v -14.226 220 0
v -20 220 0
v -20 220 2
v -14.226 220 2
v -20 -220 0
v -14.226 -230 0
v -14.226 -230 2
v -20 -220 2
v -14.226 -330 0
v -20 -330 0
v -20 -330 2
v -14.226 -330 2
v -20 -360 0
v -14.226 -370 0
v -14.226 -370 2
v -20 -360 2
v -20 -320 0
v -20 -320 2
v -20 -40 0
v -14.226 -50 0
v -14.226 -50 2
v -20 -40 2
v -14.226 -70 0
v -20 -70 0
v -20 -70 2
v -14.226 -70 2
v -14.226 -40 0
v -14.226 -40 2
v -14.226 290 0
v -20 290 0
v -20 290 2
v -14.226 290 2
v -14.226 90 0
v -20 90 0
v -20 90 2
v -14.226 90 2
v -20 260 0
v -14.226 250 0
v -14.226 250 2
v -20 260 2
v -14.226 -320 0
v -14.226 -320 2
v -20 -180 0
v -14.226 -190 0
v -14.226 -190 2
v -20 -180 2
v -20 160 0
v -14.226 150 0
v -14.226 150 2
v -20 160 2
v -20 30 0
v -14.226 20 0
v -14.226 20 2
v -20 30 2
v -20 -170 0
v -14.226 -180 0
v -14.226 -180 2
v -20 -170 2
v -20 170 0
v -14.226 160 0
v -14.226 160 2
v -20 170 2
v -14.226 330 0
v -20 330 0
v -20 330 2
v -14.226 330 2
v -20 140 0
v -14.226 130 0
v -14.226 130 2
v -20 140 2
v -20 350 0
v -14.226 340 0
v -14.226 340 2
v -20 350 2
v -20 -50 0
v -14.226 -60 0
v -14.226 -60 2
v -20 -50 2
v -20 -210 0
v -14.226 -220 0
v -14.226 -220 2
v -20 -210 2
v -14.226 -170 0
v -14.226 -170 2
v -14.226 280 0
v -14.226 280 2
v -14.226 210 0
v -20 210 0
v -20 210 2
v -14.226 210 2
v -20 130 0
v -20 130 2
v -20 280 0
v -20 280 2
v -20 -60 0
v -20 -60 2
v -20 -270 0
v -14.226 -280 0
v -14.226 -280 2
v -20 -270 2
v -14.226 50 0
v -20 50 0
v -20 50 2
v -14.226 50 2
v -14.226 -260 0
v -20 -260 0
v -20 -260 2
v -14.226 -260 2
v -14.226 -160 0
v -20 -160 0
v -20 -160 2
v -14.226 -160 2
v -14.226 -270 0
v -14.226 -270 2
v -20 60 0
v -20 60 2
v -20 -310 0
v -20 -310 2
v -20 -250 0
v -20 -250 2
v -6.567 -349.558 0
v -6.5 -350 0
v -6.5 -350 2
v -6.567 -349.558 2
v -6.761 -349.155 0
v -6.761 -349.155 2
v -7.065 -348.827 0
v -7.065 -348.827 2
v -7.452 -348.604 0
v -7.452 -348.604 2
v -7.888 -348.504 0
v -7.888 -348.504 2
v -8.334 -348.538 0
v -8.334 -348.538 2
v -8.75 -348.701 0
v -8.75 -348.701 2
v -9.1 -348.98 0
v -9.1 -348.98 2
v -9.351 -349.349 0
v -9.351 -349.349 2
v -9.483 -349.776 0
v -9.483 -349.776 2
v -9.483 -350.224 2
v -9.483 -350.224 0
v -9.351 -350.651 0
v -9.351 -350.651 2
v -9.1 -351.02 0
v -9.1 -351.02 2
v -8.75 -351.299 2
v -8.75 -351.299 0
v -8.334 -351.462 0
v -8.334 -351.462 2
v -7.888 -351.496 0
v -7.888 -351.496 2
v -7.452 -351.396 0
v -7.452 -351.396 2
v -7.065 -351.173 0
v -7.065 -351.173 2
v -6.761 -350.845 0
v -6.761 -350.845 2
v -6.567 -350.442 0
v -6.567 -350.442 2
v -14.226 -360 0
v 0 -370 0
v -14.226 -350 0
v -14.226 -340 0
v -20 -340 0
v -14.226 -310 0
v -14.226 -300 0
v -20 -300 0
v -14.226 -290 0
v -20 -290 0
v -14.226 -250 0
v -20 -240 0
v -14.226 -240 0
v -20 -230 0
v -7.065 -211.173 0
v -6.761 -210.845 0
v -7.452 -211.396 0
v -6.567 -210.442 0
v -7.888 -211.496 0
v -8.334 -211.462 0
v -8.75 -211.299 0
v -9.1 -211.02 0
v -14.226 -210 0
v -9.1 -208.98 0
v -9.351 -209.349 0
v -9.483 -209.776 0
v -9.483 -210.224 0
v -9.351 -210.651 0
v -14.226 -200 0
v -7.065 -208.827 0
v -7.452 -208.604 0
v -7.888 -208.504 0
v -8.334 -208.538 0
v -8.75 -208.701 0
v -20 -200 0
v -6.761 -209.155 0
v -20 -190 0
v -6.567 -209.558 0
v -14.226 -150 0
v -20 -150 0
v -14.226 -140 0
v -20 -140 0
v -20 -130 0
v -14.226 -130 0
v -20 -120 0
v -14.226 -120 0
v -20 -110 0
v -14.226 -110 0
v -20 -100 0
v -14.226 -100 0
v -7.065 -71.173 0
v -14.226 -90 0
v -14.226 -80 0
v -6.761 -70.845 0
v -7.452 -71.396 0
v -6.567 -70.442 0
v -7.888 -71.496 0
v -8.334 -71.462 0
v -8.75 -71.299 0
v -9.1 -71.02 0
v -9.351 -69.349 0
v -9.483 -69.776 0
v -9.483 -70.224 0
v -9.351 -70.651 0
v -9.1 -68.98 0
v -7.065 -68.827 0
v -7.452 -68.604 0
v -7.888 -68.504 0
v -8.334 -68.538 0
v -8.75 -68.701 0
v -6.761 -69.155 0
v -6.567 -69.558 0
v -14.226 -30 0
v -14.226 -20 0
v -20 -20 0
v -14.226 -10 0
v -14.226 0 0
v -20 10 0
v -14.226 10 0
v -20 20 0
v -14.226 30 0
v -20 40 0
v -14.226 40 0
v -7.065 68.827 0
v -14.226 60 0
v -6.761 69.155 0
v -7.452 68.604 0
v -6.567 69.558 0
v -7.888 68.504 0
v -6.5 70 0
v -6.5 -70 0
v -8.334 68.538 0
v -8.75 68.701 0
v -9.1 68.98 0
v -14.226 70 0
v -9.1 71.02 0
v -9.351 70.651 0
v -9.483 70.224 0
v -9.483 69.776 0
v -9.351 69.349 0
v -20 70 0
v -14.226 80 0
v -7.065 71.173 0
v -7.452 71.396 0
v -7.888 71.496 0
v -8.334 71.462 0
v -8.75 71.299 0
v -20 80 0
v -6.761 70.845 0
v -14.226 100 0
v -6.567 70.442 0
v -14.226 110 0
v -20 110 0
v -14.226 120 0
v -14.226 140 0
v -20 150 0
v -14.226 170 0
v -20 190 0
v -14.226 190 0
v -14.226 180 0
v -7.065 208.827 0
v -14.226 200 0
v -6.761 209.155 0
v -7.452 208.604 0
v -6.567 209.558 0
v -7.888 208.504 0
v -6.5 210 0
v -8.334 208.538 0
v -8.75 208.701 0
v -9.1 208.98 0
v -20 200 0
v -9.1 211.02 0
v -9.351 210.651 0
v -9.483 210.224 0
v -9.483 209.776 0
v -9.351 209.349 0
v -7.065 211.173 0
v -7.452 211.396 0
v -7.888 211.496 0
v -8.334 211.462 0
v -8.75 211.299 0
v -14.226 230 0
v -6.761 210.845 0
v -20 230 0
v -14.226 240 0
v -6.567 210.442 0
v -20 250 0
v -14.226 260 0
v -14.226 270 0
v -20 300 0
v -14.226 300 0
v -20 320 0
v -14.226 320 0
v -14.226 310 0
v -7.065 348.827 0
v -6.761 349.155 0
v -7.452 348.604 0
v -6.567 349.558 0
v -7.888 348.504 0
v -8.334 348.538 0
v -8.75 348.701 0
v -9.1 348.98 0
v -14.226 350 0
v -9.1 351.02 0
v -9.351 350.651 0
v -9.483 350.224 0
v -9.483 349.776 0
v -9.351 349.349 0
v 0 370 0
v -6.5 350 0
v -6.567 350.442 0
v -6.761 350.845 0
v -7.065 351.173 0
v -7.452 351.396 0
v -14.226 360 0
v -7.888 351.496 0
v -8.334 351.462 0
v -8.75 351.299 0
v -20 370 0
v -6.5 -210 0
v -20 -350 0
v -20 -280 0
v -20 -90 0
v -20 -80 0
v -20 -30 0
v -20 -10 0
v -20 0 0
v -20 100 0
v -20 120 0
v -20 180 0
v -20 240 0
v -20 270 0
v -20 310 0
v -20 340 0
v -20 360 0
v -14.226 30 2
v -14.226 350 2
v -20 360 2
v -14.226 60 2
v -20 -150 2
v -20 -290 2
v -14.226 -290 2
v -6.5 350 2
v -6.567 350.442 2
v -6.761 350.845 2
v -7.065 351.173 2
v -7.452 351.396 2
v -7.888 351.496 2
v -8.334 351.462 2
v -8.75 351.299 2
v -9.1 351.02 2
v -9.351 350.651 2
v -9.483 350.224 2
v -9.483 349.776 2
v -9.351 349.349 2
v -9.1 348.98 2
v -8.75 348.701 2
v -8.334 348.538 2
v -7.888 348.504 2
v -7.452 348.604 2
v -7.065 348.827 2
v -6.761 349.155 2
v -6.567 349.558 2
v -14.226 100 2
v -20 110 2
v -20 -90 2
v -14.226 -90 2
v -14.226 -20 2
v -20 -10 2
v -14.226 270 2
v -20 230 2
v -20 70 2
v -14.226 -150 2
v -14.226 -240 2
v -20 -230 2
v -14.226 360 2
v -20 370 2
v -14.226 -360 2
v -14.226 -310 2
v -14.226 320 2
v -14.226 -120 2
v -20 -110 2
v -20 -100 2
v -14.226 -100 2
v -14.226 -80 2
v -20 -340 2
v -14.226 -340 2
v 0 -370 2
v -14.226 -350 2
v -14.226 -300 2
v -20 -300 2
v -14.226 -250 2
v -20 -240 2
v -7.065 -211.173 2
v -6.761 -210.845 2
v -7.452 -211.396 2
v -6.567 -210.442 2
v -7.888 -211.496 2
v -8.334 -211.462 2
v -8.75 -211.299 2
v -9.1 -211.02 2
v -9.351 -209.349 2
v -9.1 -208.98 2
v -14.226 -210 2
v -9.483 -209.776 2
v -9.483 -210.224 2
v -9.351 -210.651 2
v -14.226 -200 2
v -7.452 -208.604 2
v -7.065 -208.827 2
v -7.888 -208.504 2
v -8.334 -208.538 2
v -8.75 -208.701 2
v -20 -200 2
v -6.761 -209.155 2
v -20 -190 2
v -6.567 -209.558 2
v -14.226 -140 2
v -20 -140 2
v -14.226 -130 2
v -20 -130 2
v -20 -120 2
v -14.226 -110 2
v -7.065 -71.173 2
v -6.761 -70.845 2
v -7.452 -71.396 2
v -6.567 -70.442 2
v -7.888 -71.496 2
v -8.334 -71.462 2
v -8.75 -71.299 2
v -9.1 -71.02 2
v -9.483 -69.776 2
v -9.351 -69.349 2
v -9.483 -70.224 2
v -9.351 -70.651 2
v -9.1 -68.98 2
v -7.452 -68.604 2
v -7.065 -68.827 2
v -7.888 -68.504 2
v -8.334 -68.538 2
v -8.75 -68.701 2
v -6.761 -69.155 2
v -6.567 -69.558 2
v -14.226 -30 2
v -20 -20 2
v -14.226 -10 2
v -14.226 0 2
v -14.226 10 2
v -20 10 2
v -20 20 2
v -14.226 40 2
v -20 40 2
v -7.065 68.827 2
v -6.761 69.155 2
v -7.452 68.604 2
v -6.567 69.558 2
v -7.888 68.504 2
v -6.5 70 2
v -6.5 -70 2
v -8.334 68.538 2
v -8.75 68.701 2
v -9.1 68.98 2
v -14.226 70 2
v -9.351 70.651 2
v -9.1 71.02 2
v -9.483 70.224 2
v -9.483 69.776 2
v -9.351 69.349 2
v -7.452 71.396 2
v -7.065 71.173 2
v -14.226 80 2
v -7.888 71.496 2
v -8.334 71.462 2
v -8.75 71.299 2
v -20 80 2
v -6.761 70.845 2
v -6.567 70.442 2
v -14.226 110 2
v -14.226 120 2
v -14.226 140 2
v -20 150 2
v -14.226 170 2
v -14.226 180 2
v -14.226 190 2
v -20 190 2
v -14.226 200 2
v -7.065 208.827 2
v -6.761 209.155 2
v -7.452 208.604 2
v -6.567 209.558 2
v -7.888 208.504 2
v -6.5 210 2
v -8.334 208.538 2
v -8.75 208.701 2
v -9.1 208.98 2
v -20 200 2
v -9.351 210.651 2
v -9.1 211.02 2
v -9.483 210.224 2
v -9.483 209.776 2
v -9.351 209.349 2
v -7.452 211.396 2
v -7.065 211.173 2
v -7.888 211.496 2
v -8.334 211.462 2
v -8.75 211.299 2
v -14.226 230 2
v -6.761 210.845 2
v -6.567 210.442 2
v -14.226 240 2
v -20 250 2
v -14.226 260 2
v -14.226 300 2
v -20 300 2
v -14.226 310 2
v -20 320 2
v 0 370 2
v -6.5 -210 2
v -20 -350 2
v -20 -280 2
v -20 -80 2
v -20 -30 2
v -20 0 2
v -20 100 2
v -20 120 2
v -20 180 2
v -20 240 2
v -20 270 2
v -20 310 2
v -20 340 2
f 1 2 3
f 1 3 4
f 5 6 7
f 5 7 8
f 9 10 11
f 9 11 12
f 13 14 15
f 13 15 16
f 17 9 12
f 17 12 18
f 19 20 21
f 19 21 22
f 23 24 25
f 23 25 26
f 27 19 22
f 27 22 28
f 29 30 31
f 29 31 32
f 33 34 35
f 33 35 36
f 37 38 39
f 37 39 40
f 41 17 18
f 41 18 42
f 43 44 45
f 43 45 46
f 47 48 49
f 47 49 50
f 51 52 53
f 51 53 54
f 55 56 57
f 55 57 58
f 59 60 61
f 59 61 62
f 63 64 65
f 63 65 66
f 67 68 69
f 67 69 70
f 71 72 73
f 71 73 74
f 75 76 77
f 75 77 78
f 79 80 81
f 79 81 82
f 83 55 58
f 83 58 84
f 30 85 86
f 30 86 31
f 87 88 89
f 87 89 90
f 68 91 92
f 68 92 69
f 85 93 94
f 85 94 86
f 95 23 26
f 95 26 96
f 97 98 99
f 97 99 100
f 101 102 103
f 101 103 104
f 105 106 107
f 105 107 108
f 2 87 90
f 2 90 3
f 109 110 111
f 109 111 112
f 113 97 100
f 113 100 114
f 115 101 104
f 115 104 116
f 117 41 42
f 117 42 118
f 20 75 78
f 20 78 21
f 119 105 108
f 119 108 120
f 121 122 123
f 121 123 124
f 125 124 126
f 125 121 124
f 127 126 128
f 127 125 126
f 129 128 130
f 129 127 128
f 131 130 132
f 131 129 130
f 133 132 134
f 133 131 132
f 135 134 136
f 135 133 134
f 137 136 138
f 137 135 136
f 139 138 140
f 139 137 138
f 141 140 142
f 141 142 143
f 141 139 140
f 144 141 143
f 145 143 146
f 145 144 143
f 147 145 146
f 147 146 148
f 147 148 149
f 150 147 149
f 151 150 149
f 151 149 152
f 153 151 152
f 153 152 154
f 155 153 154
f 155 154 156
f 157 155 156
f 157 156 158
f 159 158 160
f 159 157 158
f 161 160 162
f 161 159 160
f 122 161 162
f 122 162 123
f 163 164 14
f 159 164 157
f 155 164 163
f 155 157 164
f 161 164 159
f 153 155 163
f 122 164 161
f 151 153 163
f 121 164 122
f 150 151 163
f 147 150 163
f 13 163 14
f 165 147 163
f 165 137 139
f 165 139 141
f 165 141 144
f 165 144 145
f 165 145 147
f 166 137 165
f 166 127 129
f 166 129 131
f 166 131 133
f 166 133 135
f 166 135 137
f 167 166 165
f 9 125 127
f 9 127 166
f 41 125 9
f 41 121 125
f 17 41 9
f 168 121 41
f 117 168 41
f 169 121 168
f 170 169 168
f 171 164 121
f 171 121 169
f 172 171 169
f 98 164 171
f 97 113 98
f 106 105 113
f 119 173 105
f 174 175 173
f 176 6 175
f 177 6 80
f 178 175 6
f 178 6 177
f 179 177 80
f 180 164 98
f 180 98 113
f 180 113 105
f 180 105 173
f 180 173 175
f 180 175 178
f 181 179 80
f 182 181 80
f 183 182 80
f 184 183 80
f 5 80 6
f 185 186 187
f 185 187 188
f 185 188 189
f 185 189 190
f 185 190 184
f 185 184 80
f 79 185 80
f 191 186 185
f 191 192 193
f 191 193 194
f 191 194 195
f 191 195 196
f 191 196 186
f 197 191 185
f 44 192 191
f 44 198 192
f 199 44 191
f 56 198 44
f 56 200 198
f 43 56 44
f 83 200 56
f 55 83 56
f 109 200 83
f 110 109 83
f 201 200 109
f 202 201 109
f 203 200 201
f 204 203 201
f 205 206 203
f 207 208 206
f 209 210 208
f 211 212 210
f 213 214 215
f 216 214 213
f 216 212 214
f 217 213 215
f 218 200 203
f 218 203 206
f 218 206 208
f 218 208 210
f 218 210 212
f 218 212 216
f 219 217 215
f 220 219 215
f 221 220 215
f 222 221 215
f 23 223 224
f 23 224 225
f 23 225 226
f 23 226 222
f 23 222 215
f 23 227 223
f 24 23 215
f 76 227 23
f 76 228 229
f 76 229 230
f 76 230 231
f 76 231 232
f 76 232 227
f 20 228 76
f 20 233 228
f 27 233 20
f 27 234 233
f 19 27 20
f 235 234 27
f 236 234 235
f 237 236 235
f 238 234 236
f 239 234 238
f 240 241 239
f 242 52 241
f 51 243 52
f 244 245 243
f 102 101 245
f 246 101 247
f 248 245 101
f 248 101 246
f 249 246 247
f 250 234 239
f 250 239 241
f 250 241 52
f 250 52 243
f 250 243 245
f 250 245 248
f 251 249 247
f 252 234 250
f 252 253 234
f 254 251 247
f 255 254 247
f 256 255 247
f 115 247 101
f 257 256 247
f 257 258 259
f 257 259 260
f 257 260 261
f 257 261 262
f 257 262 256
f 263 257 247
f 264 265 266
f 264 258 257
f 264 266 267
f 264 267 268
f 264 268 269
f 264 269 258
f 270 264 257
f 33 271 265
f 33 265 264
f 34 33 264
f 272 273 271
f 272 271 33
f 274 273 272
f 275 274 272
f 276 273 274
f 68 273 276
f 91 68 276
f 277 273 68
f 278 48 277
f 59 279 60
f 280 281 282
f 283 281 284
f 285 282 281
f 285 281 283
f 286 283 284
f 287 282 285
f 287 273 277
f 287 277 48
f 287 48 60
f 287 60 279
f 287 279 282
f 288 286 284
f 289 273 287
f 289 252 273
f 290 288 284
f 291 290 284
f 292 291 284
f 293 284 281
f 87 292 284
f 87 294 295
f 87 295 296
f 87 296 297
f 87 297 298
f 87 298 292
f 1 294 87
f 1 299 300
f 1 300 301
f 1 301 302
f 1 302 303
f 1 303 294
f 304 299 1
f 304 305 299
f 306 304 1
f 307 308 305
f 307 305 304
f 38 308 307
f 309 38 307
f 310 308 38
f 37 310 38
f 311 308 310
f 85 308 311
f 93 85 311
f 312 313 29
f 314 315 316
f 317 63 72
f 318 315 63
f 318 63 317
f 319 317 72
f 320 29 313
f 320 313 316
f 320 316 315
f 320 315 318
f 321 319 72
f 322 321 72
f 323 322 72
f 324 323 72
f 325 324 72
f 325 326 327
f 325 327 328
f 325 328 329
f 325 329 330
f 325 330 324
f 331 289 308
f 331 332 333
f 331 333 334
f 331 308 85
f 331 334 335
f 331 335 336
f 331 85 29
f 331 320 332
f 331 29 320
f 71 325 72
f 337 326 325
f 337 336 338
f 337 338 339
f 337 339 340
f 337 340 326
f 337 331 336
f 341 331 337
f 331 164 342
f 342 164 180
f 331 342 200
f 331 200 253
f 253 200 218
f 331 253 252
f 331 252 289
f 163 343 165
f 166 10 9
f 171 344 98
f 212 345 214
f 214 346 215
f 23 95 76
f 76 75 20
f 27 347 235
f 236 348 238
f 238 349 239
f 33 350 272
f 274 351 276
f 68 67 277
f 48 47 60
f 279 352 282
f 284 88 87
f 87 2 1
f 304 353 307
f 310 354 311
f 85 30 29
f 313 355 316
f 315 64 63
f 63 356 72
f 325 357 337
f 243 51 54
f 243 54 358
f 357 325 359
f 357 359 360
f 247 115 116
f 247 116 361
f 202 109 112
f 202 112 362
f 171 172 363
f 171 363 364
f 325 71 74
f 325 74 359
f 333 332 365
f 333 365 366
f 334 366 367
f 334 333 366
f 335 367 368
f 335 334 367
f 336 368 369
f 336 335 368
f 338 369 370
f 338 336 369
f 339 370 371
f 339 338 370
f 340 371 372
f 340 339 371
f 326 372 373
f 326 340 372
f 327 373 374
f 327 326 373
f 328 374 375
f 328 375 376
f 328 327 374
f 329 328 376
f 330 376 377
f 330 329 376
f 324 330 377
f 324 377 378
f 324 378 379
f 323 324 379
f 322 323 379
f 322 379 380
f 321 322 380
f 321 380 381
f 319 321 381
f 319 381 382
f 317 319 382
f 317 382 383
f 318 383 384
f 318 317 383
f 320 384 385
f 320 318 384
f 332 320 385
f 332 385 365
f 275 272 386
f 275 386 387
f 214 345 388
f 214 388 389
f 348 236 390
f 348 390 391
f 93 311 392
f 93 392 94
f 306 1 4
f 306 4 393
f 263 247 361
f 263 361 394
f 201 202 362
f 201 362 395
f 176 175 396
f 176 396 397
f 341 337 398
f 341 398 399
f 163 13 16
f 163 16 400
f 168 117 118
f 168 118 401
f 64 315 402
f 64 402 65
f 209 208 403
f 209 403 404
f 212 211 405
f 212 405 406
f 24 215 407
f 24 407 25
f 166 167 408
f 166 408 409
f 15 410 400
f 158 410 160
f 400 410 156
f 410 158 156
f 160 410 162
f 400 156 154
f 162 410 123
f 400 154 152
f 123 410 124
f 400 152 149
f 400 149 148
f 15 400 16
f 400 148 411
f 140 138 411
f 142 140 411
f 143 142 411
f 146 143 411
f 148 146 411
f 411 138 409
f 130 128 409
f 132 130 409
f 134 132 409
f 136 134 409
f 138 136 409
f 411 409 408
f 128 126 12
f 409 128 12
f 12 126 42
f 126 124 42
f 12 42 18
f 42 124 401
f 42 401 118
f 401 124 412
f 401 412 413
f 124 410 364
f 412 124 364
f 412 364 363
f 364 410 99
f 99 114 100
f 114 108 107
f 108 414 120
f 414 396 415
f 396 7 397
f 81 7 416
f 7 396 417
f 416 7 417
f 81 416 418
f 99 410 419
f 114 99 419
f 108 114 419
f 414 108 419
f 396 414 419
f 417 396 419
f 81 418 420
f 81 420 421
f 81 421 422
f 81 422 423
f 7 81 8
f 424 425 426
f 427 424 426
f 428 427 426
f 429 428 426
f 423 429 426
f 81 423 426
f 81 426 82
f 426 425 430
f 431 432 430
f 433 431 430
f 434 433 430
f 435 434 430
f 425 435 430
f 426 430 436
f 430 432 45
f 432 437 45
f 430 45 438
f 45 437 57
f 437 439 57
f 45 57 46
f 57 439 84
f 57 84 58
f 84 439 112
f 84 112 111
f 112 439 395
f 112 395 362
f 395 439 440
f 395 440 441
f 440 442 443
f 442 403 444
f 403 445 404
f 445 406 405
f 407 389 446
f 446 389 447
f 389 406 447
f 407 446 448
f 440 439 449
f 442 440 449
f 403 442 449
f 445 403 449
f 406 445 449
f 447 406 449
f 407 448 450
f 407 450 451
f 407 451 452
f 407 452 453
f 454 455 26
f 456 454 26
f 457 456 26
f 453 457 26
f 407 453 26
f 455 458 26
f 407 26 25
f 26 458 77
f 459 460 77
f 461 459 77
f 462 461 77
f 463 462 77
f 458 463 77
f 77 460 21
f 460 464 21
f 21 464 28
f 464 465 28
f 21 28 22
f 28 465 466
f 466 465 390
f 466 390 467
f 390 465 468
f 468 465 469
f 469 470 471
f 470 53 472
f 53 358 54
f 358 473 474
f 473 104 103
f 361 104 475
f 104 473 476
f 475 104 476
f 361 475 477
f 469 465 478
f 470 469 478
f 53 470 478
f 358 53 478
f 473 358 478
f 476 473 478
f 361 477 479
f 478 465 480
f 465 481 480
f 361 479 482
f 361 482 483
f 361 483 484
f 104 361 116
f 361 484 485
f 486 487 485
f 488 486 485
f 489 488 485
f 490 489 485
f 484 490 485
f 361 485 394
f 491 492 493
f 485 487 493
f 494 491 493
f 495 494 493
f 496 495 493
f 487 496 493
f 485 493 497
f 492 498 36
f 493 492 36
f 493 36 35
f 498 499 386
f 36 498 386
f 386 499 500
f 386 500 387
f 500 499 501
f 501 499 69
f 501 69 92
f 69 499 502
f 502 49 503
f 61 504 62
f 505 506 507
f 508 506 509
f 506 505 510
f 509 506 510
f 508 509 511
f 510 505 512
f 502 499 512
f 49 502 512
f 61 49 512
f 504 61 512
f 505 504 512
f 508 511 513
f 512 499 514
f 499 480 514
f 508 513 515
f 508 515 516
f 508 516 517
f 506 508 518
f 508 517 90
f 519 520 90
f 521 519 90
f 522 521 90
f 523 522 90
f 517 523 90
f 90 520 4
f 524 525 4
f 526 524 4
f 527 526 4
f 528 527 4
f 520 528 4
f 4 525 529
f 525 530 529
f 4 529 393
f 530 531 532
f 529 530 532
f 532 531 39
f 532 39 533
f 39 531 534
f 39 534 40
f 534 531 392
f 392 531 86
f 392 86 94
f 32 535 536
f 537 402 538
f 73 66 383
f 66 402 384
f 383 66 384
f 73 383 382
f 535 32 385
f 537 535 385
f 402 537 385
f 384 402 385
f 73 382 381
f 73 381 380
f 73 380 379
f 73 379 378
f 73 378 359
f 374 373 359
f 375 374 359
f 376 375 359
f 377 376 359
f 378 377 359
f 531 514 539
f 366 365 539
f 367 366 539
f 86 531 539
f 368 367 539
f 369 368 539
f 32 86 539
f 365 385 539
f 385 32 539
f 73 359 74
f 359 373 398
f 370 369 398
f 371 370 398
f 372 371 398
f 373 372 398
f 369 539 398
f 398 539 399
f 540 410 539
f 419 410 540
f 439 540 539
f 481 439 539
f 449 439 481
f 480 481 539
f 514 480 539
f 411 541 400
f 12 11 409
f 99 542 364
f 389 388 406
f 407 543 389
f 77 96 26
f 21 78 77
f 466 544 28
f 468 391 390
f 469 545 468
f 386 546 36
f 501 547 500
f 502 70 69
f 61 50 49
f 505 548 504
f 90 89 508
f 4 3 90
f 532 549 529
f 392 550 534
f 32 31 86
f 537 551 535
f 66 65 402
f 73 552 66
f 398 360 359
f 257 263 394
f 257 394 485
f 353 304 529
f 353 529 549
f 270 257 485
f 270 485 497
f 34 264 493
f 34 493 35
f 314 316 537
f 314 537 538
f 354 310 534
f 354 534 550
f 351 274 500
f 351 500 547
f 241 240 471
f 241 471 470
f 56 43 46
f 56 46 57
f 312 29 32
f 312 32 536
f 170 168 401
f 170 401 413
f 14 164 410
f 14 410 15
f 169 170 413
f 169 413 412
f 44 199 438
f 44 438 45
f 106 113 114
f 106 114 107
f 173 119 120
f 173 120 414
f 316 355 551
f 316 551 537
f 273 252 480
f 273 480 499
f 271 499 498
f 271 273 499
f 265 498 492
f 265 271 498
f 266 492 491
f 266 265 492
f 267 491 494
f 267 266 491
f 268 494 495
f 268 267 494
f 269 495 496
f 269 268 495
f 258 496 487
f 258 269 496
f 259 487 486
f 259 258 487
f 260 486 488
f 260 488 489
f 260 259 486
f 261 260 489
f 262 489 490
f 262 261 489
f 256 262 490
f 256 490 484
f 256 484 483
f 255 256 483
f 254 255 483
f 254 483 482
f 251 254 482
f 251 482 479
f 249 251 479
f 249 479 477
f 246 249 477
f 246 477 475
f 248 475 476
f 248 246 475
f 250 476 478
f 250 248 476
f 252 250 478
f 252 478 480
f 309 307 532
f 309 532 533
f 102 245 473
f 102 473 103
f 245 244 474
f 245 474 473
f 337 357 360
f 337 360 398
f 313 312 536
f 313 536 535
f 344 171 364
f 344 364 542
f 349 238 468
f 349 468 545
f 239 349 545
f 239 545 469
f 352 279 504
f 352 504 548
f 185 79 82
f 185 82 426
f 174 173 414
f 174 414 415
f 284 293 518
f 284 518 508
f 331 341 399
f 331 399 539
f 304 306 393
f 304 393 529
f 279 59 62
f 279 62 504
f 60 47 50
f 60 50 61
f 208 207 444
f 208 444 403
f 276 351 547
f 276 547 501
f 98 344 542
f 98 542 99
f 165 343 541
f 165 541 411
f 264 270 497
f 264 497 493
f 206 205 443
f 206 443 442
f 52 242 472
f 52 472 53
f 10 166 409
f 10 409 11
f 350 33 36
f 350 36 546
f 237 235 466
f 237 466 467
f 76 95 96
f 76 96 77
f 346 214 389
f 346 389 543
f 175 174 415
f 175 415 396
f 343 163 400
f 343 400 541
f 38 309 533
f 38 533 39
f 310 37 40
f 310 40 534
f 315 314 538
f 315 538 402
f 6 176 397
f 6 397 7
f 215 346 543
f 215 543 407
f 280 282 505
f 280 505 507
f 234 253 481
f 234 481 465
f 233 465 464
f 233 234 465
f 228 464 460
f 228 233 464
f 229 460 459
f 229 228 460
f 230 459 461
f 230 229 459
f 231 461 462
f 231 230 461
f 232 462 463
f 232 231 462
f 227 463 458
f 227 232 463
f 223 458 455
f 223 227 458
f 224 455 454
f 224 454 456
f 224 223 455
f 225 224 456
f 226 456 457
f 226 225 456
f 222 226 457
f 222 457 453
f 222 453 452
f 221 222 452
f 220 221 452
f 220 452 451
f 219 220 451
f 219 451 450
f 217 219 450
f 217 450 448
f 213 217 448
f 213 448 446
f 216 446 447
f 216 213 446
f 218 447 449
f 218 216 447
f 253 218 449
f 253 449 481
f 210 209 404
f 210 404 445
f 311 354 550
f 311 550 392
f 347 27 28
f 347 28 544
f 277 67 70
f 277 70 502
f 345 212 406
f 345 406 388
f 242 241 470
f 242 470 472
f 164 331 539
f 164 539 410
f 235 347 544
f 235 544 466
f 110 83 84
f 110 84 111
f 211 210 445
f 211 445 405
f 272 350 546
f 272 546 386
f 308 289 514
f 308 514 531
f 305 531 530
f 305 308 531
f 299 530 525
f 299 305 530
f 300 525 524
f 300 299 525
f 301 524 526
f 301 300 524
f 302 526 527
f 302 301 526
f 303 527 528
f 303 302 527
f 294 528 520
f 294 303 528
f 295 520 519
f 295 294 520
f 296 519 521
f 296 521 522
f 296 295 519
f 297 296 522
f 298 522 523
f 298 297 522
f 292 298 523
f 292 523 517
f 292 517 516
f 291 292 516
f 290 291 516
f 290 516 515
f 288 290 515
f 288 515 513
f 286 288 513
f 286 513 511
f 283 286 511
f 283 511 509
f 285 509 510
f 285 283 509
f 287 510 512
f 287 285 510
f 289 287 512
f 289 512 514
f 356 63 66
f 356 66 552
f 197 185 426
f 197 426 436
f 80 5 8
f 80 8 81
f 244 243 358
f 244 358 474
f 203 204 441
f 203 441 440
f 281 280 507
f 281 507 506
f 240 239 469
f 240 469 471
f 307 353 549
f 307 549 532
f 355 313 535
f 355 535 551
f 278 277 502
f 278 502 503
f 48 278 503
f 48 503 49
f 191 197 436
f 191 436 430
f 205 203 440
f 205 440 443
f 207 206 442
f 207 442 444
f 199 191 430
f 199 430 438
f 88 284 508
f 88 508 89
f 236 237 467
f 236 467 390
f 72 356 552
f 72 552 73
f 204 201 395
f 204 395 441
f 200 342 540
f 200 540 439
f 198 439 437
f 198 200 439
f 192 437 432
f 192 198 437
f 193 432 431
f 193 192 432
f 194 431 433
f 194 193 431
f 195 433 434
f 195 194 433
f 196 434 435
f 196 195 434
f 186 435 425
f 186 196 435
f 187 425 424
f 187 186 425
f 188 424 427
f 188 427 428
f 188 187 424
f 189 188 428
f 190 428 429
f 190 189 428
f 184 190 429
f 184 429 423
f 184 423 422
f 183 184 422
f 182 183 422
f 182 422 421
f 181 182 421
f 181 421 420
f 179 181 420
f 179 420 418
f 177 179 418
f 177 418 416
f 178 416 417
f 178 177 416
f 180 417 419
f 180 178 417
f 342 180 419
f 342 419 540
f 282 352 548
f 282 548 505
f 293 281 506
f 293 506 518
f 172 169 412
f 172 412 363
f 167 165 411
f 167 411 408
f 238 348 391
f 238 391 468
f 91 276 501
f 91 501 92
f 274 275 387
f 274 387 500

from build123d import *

# Parameters (mm, degrees)
SKETCH1_R           = 1.5
BOSS_EXTRUDE1_DEPTH = 2


with BuildPart() as part:
    # Sketch1 → Boss-Extrude1 (new body)
    with BuildSketch(Plane.XY):
        Polygon((0, 370), (0, -370), (-14.226497308, -370), (-20, -360), (-14.226497308, -360), (-20, -350), (-14.226497308, -350), (-20, -340), (-14.226497308, -340), (-20, -330), (-14.226497308, -330), (-20, -320), (-14.226497308, -320), (-20, -310), (-14.226497308, -310), (-20, -300), (-14.226497308, -300), (-20, -290), (-14.226497308, -290), (-20, -280), (-14.226497308, -280), (-20, -270), (-14.226497308, -270), (-20, -260), (-14.226497308, -260), (-20, -250), (-14.226497308, -250), (-20, -240), (-14.226497308, -240), (-20, -230), (-14.226497308, -230), (-20, -220), (-14.226497308, -220), (-20, -210), (-14.226497308, -210), (-20, -200), (-14.226497308, -200), (-20, -190), (-14.226497308, -190), (-20, -180), (-14.226497308, -180), (-20, -170), (-14.226497308, -170), (-20, -160), (-14.226497308, -160), (-20, -150), (-14.226497308, -150), (-20, -140), (-14.226497308, -140), (-20, -130), (-14.226497308, -130), (-20, -120), (-14.226497308, -120), (-20, -110), (-14.226497308, -110), (-20, -100), (-14.226497308, -100), (-20, -90), (-14.226497308, -90), (-20, -80), (-14.226497308, -80), (-20, -70), (-14.226497308, -70), (-20, -60), (-14.226497308, -60), (-20, -50), (-14.226497308, -50), (-20, -40), (-14.226497308, -40), (-20, -30), (-14.226497308, -30), (-20, -20), (-14.226497308, -20), (-20, -10), (-14.226497308, -10), (-20, 0), (-14.226497308, 0), (-20, 10), (-14.226497308, 10), (-20, 20), (-14.226497308, 20), (-20, 30), (-14.226497308, 30), (-20, 40), (-14.226497308, 40), (-20, 50), (-14.226497308, 50), (-20, 60), (-14.226497308, 60), (-20, 70), (-14.226497308, 70), (-20, 80), (-14.226497308, 80), (-20, 90), (-14.226497308, 90), (-20, 100), (-14.226497308, 100), (-20, 110), (-14.226497308, 110), (-20, 120), (-14.226497308, 120), (-20, 130), (-14.226497308, 130), (-20, 140), (-14.226497308, 140), (-20, 150), (-14.226497308, 150), (-20, 160), (-14.226497308, 160), (-20, 170), (-14.226497308, 170), (-20, 180), (-14.226497308, 180), (-20, 190), (-14.226497308, 190), (-20, 200), (-14.226497308, 200), (-20, 210), (-14.226497308, 210), (-20, 220), (-14.226497308, 220), (-20, 230), (-14.226497308, 230), (-20, 240), (-14.226497308, 240), (-20, 250), (-14.226497308, 250), (-20, 260), (-14.226497308, 260), (-20, 270), (-14.226497308, 270), (-20, 280), (-14.226497308, 280), (-20, 290), (-14.226497308, 290), (-20, 300), (-14.226497308, 300), (-20, 310), (-14.226497308, 310), (-20, 320), (-14.226497308, 320), (-20, 330), (-14.226497308, 330), (-20, 340), (-14.226497308, 340), (-20, 350), (-14.226497308, 350), (-20, 360), (-14.226497308, 360), (-20, 370), align=None)
        with Locations((-8, 350)):
            Circle(SKETCH1_R, mode=Mode.SUBTRACT)
        with Locations((-8, 210)):
            Circle(SKETCH1_R, mode=Mode.SUBTRACT)
        with Locations((-8, 70)):
            Circle(SKETCH1_R, mode=Mode.SUBTRACT)
        with Locations((-8, -70)):
            Circle(SKETCH1_R, mode=Mode.SUBTRACT)
        with Locations((-8, -210)):
            Circle(SKETCH1_R, mode=Mode.SUBTRACT)
        with Locations((-8, -350)):
            Circle(SKETCH1_R, mode=Mode.SUBTRACT)
    extrude(amount=BOSS_EXTRUDE1_DEPTH)


solid = part.part
